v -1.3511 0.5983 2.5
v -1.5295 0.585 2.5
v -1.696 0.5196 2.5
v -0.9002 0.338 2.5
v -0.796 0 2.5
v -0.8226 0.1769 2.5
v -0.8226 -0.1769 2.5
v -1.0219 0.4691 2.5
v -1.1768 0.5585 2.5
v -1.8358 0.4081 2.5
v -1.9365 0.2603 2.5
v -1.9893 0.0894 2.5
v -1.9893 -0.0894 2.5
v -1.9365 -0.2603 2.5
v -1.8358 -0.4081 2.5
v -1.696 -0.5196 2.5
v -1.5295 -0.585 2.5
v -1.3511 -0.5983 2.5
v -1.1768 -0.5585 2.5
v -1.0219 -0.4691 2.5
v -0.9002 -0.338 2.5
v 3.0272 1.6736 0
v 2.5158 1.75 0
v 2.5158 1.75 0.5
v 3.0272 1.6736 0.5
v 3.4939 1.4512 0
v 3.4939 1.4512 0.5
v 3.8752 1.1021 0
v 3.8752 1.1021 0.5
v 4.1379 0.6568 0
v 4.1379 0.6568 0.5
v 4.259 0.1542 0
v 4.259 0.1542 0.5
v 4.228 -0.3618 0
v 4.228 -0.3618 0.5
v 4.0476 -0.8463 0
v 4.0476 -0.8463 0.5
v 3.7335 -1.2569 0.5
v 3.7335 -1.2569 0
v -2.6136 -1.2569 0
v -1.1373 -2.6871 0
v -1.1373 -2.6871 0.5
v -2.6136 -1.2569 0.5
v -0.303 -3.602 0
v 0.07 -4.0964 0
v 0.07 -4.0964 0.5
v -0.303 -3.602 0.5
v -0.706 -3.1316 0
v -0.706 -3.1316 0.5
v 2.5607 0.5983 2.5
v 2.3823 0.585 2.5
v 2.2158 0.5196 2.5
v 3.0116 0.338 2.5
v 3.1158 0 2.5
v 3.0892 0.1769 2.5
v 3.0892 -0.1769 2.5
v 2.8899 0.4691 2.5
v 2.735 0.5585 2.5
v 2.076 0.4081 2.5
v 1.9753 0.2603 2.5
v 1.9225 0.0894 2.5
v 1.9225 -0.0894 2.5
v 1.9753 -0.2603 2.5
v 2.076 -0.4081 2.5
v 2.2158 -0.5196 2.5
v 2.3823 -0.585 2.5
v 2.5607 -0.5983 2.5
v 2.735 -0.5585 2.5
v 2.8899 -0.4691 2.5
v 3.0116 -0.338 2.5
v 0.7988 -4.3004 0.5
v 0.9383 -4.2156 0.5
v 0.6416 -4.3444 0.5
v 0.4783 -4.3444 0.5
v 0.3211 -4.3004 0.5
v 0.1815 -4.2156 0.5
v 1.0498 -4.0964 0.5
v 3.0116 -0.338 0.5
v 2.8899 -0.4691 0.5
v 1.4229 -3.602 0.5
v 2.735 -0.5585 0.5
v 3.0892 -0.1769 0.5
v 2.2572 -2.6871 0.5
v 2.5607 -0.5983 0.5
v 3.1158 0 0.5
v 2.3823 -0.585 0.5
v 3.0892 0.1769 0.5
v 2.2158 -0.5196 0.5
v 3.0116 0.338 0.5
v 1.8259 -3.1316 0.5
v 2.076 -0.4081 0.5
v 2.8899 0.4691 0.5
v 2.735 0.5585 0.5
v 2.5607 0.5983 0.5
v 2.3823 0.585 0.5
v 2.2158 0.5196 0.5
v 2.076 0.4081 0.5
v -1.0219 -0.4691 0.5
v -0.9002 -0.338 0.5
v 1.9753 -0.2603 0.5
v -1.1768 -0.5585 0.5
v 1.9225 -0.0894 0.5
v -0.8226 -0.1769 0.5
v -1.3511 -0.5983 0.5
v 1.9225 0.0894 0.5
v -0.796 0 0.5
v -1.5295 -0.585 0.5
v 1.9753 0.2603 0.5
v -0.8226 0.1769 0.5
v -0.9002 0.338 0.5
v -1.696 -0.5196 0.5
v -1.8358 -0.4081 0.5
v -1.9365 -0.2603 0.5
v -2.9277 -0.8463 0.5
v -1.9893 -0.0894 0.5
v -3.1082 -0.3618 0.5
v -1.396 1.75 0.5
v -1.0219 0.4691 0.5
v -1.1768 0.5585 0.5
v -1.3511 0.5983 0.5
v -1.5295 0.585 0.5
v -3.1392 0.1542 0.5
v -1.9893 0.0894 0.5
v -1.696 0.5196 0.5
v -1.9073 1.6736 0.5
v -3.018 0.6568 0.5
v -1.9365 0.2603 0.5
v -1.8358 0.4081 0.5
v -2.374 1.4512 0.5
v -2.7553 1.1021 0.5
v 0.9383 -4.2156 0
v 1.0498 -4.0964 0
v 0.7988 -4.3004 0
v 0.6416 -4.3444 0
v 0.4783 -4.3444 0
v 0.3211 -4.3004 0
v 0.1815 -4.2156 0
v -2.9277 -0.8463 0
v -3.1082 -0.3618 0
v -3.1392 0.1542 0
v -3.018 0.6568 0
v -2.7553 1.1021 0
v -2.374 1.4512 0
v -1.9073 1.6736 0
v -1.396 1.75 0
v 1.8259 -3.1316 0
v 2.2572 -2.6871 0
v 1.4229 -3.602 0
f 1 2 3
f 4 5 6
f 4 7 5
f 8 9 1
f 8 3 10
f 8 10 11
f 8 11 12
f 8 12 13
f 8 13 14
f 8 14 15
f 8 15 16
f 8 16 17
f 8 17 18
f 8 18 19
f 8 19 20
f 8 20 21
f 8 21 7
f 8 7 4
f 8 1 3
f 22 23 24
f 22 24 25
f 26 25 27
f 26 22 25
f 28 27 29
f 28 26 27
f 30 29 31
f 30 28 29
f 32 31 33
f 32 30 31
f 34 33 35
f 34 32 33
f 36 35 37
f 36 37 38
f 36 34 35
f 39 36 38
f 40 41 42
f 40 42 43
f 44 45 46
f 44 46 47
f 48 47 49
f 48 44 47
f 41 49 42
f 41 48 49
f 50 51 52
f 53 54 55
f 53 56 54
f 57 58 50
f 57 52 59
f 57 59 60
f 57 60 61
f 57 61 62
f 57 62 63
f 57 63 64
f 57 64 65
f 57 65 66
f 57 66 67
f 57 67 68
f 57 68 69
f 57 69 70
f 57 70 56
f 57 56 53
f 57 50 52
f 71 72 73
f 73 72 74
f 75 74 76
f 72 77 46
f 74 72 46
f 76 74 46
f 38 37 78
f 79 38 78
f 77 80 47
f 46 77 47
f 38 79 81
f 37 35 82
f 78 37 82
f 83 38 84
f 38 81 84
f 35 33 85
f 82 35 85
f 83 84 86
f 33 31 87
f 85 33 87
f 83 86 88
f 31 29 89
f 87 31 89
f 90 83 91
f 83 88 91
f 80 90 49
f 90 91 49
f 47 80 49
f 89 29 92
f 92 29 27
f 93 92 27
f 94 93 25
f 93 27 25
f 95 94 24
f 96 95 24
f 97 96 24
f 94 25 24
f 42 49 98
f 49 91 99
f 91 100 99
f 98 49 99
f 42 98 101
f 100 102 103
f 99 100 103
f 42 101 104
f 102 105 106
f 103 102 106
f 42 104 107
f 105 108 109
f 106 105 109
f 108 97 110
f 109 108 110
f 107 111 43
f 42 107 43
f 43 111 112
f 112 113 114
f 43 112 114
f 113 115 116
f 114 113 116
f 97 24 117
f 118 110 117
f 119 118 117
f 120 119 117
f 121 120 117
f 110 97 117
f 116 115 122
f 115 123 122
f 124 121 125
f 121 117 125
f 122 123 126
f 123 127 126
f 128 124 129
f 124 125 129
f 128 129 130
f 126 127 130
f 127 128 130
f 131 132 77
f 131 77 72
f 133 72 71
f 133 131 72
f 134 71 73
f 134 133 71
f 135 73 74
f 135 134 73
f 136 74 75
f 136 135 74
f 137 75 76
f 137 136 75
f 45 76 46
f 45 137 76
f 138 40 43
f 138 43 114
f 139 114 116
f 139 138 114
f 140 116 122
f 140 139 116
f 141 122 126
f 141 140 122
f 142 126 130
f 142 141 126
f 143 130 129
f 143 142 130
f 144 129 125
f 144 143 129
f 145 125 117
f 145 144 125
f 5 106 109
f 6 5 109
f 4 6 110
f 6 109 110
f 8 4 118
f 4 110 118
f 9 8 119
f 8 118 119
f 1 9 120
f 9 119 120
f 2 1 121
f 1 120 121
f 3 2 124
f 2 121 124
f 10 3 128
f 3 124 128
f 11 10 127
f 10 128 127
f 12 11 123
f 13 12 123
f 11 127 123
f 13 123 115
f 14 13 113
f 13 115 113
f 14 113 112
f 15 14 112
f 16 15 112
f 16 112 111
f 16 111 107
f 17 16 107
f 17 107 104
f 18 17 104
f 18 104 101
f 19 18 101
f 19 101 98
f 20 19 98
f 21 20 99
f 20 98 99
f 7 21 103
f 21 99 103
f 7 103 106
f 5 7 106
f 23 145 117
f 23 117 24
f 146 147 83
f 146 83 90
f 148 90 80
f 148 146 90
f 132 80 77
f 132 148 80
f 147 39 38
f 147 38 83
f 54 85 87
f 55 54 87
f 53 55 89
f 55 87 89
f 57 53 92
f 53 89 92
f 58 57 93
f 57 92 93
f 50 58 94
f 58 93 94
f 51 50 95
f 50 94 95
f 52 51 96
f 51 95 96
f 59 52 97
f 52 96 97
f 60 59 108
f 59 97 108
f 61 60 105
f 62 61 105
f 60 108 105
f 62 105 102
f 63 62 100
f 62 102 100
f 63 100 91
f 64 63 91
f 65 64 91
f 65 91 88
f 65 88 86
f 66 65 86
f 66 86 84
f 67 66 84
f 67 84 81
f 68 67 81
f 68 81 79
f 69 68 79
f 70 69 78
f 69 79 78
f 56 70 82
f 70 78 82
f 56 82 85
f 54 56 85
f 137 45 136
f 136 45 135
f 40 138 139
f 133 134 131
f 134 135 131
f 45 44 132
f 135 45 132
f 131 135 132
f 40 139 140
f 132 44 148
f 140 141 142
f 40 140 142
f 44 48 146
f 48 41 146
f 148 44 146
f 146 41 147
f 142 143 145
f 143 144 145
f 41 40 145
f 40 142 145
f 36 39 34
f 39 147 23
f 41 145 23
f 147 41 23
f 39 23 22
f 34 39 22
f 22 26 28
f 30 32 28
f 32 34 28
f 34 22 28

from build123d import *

# Parameters (mm, degrees)
SKETCH2_R                = 0.6
BOSS_EXTRUDE1_DEPTH      = 0.5
SKETCH3_R                = 0.6
BOSS_EXTRUDE2_DEPTH      = 2
BOSS_EXTRUDE2_DEPTH_BACK = 0.5


with BuildPart() as part:
    # Sketch2 → Boss-Extrude1 (new body)
    with BuildSketch(Plane.XY):
        with BuildLine():
            Line((-1.395963948, 1.75), (2.515834251, 1.75))
            ThreePointArc((2.515834251, 1.75), (4.137889568, 0.656838298), (3.733466312, -1.256929657))
            Line((3.733466312, -1.256929657), (2.257187702, -2.687052781))
            ThreePointArc((2.257187702, -2.687052781), (1.620755288, -3.363652659), (1.049849305, -4.096387243))
            ThreePointArc((1.049849305, -4.096387243), (0.559935151, -4.35), (0.070020998, -4.096387243))
            ThreePointArc((0.070020998, -4.096387243), (-0.500884985, -3.363652659), (-1.137317399, -2.687052781))
            Line((-1.137317399, -2.687052781), (-2.61359601, -1.256929657))
            ThreePointArc((-2.61359601, -1.256929657), (-3.018019265, 0.656838298), (-1.395963948, 1.75))
        make_face()
        with Locations((-1.395963948, 0)):
            Circle(SKETCH2_R, mode=Mode.SUBTRACT)
        with Locations((2.515834251, 0)):
            Circle(SKETCH2_R, mode=Mode.SUBTRACT)
    extrude(amount=BOSS_EXTRUDE1_DEPTH)

    # Sketch3 → Boss-Extrude2 (add, two sides)
    with BuildSketch(Plane.XY.offset(0.5)) as boss_extrude2_sk:
        with Locations((-1.395963948, 0)):
            Circle(SKETCH3_R)
        with Locations((2.515834251, 0)):
            Circle(SKETCH3_R)
    extrude(amount=BOSS_EXTRUDE2_DEPTH)
    extrude(boss_extrude2_sk.sketch, amount=-BOSS_EXTRUDE2_DEPTH_BACK)


solid = part.part
